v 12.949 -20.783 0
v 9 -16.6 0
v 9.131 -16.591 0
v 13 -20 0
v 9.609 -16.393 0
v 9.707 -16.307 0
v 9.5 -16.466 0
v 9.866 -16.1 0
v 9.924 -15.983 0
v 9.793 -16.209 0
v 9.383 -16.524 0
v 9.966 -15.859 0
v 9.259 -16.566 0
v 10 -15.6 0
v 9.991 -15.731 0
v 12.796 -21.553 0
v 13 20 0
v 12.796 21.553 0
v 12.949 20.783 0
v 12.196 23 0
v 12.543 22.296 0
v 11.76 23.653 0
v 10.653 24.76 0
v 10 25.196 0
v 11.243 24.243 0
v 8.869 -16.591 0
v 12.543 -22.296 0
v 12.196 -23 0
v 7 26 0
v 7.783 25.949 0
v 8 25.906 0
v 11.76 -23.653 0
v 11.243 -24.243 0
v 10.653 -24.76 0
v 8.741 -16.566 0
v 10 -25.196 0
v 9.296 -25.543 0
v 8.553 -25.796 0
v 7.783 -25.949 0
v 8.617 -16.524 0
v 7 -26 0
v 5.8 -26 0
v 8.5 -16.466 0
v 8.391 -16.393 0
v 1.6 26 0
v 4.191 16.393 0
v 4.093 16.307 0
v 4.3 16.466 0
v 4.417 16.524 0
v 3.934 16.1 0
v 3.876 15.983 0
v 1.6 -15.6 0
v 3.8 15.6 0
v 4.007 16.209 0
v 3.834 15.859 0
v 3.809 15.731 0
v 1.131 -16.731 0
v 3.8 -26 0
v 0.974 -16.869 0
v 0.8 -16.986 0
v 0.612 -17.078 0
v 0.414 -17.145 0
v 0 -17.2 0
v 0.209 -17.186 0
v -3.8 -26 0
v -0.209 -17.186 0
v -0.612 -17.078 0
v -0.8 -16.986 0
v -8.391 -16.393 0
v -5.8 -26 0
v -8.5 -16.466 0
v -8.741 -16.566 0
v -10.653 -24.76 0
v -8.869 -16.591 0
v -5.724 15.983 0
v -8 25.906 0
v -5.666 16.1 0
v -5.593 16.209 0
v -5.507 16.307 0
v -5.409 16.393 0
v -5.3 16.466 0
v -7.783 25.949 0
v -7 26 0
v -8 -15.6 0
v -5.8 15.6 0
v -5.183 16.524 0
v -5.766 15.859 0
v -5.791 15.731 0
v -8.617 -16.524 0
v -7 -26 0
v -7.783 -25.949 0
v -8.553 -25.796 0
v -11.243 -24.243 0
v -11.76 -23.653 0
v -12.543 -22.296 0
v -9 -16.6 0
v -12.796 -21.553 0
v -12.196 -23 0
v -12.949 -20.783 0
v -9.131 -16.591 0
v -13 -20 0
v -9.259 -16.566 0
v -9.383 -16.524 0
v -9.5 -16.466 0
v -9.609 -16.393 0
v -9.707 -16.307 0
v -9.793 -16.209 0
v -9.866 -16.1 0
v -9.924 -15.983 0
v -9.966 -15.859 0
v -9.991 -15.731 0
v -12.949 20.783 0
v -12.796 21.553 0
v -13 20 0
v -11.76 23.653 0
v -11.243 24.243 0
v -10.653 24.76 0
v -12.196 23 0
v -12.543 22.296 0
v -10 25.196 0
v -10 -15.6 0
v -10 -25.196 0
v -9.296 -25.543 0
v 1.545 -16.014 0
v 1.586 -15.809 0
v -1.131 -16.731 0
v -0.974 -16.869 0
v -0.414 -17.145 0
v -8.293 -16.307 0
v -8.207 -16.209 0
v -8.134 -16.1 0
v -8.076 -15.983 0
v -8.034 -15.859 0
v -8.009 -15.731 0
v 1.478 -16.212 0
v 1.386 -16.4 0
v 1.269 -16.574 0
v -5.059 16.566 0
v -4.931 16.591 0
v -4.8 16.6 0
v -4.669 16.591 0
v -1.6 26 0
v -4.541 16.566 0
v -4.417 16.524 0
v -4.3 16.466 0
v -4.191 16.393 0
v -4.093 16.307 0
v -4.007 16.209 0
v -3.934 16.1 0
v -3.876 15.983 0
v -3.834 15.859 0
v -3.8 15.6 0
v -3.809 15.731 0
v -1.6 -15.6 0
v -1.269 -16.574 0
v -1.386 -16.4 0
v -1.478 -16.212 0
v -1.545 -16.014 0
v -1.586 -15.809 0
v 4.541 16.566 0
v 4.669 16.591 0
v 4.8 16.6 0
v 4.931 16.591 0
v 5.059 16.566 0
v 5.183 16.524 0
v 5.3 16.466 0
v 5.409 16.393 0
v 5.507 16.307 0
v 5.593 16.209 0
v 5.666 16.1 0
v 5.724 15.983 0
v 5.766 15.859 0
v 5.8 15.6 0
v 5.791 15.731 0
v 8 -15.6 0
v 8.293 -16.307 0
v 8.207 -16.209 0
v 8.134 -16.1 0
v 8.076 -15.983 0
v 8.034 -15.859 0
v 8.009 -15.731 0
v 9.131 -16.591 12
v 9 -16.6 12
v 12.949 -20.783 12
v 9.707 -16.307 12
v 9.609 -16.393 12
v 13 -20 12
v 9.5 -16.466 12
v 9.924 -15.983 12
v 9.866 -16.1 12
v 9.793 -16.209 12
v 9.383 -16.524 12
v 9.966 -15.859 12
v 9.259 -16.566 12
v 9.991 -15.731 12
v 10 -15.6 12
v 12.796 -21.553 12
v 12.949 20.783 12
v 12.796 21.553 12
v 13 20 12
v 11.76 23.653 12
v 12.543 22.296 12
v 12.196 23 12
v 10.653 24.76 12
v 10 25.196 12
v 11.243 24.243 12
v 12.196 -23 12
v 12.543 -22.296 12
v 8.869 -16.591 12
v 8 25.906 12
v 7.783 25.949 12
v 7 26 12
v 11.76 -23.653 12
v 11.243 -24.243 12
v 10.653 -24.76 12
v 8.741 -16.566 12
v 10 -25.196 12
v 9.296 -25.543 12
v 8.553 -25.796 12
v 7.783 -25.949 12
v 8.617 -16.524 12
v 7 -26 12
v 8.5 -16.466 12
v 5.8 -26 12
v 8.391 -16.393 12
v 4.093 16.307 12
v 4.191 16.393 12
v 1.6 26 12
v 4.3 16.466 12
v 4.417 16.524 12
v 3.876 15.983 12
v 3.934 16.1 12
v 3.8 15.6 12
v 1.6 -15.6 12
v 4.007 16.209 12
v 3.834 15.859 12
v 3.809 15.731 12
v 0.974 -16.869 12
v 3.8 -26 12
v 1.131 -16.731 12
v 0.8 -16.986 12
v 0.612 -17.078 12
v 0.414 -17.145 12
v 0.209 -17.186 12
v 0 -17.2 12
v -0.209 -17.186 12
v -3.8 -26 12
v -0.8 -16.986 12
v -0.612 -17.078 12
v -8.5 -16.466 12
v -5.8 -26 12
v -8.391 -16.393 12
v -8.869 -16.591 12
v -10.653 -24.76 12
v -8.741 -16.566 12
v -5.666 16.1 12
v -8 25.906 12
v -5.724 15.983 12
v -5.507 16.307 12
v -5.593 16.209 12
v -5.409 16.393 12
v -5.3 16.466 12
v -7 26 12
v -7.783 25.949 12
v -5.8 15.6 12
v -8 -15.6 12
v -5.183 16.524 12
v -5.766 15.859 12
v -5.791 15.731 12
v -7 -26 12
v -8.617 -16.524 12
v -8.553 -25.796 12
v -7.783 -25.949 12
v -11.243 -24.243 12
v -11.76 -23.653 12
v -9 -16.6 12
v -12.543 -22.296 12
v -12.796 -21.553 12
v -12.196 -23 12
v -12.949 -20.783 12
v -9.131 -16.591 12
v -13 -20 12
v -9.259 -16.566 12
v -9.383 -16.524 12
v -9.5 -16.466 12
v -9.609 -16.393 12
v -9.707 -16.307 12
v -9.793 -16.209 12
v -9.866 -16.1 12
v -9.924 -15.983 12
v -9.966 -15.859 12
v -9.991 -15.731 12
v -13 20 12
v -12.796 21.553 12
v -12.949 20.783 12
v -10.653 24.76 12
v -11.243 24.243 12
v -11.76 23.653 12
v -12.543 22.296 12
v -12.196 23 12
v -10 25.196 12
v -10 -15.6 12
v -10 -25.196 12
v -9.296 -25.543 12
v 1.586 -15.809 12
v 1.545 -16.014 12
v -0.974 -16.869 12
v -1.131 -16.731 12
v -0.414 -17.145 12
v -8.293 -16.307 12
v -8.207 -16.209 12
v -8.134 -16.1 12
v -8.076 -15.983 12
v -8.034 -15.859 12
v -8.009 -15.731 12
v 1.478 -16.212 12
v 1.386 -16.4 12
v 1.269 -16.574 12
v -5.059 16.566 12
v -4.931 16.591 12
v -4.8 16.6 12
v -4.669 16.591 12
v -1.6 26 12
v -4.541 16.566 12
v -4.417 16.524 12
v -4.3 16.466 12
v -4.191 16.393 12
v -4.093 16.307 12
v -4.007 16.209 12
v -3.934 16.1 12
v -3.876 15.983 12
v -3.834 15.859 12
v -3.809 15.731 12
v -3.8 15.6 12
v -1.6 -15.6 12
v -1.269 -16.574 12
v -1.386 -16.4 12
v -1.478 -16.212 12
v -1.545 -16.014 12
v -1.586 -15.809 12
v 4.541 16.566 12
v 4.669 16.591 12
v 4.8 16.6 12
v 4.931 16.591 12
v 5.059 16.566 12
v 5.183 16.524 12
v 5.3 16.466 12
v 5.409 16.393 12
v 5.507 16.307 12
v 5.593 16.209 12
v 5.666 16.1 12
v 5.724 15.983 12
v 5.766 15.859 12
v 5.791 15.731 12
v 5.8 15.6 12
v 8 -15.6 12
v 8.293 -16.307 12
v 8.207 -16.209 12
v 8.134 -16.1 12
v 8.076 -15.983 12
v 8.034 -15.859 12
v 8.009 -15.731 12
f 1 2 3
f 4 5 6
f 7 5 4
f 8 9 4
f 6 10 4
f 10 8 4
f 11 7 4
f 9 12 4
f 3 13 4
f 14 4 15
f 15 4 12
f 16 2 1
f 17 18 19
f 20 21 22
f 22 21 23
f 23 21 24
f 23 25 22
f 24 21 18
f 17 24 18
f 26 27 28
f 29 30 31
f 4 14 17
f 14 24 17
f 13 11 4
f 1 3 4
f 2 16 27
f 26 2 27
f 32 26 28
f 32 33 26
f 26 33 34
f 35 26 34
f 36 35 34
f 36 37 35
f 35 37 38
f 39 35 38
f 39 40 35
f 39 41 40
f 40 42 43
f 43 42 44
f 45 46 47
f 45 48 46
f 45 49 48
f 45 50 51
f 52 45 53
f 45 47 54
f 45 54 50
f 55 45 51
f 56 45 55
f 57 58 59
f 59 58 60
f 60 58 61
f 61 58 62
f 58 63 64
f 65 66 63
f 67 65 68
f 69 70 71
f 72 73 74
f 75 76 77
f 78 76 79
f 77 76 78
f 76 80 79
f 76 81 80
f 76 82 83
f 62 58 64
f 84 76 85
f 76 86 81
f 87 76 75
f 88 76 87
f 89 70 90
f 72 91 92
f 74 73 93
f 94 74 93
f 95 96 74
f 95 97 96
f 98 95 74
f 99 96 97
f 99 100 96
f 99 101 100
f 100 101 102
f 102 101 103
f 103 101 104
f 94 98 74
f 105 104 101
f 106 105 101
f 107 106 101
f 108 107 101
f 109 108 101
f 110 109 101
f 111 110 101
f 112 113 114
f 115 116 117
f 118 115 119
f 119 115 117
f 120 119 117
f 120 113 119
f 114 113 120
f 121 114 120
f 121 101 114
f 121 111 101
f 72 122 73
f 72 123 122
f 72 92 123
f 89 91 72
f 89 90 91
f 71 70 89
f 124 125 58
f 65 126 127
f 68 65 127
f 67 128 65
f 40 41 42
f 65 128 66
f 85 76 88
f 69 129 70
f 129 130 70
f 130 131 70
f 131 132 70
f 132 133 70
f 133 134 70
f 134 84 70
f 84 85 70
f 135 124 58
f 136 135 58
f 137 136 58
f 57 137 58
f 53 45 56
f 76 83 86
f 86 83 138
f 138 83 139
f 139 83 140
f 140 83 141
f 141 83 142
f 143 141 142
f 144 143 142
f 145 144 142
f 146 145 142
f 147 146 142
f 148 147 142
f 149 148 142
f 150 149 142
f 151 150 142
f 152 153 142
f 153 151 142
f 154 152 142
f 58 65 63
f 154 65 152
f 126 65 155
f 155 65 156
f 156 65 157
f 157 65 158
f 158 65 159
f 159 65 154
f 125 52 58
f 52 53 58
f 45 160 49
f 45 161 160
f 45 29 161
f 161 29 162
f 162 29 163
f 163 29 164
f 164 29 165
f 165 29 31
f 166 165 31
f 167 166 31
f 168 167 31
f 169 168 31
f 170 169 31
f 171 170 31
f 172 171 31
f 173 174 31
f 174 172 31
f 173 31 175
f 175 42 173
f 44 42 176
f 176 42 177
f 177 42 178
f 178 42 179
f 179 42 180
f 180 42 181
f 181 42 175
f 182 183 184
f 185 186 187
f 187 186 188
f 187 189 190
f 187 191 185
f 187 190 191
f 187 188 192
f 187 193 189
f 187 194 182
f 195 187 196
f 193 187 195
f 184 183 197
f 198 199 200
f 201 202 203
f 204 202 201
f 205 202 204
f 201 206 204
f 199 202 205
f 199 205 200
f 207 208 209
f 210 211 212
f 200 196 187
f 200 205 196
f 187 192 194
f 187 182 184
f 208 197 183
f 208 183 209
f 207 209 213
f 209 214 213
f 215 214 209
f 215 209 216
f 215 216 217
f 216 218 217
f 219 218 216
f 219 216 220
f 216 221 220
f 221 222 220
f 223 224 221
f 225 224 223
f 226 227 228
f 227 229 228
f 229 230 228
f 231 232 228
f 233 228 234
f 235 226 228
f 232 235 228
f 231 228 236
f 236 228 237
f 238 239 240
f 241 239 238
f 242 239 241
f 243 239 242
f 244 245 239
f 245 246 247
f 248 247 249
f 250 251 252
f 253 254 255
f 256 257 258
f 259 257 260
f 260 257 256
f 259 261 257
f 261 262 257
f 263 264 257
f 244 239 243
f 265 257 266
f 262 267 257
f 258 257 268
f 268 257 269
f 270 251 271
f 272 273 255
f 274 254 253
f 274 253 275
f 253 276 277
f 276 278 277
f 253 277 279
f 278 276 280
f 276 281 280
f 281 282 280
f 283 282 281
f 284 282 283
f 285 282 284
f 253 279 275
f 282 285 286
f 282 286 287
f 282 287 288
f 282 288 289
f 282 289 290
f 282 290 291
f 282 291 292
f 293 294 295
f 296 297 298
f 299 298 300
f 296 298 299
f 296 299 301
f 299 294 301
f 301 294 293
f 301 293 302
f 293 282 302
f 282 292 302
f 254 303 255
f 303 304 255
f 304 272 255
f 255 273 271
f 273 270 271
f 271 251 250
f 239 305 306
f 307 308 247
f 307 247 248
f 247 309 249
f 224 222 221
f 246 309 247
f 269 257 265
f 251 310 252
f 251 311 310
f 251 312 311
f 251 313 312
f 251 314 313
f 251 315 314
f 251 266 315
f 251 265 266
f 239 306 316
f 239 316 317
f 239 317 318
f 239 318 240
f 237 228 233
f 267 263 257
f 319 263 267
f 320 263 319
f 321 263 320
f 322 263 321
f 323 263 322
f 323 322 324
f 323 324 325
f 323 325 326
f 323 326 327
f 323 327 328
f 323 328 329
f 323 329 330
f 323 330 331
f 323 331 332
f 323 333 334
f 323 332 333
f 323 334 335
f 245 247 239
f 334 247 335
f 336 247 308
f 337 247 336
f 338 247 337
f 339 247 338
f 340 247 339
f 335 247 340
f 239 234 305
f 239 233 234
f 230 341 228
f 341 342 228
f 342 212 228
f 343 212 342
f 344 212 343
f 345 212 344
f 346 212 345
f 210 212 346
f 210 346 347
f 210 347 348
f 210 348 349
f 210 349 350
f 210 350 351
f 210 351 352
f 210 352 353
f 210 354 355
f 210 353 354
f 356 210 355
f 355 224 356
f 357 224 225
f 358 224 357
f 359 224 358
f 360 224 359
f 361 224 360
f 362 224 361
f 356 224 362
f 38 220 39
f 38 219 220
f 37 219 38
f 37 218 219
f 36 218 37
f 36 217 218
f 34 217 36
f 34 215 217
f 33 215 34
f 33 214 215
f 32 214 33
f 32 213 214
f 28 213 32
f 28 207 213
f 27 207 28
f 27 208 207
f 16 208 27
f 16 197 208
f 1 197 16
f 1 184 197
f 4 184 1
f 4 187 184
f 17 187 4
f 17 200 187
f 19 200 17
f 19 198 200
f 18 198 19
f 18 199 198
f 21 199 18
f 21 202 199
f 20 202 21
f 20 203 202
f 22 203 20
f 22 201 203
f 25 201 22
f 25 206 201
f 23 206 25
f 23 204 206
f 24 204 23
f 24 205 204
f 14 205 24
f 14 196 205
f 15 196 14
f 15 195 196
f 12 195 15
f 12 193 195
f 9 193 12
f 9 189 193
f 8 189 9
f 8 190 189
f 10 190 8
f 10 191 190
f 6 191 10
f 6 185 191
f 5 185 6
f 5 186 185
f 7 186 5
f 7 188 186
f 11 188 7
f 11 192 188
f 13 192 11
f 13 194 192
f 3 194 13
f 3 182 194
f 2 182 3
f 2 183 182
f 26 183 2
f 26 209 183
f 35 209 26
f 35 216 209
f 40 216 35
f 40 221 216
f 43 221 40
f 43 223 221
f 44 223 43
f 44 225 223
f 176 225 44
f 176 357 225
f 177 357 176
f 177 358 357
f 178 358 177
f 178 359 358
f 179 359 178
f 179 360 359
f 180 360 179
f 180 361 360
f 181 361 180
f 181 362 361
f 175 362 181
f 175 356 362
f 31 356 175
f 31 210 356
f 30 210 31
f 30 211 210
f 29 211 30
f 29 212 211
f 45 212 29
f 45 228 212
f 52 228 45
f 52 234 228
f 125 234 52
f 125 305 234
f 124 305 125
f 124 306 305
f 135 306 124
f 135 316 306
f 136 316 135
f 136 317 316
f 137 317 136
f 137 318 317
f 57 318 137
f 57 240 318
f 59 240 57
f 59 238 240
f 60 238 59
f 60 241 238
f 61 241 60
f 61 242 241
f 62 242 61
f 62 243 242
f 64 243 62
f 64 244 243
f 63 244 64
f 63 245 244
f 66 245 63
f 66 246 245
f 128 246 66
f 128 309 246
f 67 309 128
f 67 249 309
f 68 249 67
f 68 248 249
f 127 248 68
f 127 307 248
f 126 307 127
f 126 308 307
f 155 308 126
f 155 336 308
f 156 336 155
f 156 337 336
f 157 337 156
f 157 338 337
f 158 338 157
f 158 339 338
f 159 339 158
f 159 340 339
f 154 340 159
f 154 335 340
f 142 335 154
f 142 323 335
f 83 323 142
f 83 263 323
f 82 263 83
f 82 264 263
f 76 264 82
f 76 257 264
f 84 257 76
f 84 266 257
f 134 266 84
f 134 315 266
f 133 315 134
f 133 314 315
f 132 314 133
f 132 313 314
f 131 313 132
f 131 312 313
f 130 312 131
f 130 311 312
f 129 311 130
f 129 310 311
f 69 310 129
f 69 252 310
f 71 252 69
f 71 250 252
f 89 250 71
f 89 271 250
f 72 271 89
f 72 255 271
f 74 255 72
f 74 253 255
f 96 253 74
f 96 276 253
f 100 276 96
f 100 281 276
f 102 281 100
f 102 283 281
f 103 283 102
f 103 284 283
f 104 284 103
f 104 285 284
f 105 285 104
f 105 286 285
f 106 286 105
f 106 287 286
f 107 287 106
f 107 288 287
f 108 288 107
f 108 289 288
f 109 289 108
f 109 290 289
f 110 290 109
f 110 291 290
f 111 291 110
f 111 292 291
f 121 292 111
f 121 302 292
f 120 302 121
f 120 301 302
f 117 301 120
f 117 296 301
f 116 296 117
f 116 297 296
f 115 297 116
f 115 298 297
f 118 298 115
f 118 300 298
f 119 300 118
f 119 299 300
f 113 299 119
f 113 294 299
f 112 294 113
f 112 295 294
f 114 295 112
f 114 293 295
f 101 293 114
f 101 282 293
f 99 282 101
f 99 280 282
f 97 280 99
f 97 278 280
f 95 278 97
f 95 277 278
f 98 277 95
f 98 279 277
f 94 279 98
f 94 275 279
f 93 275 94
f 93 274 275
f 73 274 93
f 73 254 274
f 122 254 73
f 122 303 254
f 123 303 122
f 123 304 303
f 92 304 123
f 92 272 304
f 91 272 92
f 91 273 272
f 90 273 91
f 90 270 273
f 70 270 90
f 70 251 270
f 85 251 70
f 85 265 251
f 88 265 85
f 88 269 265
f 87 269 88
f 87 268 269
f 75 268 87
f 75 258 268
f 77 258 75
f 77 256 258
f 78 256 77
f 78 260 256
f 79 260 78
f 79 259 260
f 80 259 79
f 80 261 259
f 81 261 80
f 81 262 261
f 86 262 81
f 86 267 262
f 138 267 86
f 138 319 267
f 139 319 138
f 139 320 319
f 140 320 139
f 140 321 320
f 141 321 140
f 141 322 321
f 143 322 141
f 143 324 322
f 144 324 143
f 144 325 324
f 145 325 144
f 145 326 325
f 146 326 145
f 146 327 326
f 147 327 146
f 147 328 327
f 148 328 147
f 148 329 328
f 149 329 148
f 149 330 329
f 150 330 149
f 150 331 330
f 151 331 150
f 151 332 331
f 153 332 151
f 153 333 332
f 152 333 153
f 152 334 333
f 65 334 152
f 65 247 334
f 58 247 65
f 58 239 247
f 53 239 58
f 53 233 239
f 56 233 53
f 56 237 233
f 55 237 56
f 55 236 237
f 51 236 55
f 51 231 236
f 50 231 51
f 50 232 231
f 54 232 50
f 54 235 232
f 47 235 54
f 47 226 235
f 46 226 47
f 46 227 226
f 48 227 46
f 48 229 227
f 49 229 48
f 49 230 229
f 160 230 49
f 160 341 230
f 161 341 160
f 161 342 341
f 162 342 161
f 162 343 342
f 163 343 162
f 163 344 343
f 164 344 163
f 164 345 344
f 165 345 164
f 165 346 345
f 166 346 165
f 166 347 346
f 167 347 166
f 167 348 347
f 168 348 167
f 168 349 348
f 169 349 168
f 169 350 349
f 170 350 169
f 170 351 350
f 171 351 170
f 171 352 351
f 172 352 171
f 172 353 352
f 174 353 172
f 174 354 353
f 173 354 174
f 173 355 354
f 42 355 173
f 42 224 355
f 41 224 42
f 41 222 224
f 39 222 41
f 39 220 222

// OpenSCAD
// bagclip_spring — a folded multi-leaf spring clip (copies the reference "fork"
// style). The bag's rolled top slides DOWN into the central channel; the nested
// thin leaves each flex a little, so it grips firmly yet survives in PLA because
// the strain is shared across many leaves (not one thick flexure).
//
// Flat part: the 2D profile is extruded along Z (the bite depth along the bag
// edge). Prints flat, support-free; the leaves flex in-plane (along the layers).

/* [Size] */
clip_h    = 52;    // height (Y)
clip_w    = 26;    // width  (X)
bite      = 12;    // Z depth (how much of the bag edge it grips)
corner    = 6;     // outer corner radius

/* [Spring] */
chan_w    = 3.2;   // central bag channel width (a touch under the folded bag)
chan_frac = 0.80;  // channel depth as a fraction of height
base      = 9;     // solid spring base at the bottom (the fold)
leaf_t    = 2.2;   // leaf (spring wall) thickness
relief_w  = 2.0;   // relief-slot width between leaves
relief_frac = 0.66;// relief-slot depth fraction
leaves    = 2;     // relief slots PER SIDE (more = softer, more nested look)

/* [Finger grip] */
serrated   = false; // scallop the outer edges for grip (the image-3 look)
serr_d     = 2.6;   // scallop diameter
serr_pitch = 4.2;   // scallop spacing

$fn = 48;

module rrect(w, d, r) { offset(r) offset(-r) square([w, d], center=true); }

// a rounded-bottom slot open at one end. top=true opens at the top (+Y),
// top=false opens at the bottom (-Y). Rounded closed end sits `depth` in.
module slot(x, w, depth, top) {
  yc = top ? clip_h/2 - depth : -clip_h/2 + depth;        // closed (rounded) end
  run = top ? depth + clip_h : -(depth + clip_h);
  translate([x, yc])
    union() {
      circle(d = w);
      translate([-w/2, min(0, run)]) square([w, abs(run)]);
    }
}

module clip2d() {
  d = clip_h * chan_frac;
  difference() {
    rrect(clip_w, clip_h, corner);
    slot(0, chan_w, d, true);                              // central bag mouth (opens top)
    // flanking slots alternate open-bottom / open-top -> one folded serpentine spring
    for (s = [-1, 1], k = [1 : leaves])
      slot(s * (chan_w/2 + k*(leaf_t + relief_w) - relief_w/2),
           relief_w, d, (k % 2) == 0);
    // optional scalloped finger grips down the outer edges
    if (serrated)
      for (s = [-1, 1], i = [0 : floor(clip_h / serr_pitch)])
        translate([s * clip_w/2, -clip_h/2 + corner + i*serr_pitch]) circle(d = serr_d);
  }
}

linear_extrude(bite) clip2d();
